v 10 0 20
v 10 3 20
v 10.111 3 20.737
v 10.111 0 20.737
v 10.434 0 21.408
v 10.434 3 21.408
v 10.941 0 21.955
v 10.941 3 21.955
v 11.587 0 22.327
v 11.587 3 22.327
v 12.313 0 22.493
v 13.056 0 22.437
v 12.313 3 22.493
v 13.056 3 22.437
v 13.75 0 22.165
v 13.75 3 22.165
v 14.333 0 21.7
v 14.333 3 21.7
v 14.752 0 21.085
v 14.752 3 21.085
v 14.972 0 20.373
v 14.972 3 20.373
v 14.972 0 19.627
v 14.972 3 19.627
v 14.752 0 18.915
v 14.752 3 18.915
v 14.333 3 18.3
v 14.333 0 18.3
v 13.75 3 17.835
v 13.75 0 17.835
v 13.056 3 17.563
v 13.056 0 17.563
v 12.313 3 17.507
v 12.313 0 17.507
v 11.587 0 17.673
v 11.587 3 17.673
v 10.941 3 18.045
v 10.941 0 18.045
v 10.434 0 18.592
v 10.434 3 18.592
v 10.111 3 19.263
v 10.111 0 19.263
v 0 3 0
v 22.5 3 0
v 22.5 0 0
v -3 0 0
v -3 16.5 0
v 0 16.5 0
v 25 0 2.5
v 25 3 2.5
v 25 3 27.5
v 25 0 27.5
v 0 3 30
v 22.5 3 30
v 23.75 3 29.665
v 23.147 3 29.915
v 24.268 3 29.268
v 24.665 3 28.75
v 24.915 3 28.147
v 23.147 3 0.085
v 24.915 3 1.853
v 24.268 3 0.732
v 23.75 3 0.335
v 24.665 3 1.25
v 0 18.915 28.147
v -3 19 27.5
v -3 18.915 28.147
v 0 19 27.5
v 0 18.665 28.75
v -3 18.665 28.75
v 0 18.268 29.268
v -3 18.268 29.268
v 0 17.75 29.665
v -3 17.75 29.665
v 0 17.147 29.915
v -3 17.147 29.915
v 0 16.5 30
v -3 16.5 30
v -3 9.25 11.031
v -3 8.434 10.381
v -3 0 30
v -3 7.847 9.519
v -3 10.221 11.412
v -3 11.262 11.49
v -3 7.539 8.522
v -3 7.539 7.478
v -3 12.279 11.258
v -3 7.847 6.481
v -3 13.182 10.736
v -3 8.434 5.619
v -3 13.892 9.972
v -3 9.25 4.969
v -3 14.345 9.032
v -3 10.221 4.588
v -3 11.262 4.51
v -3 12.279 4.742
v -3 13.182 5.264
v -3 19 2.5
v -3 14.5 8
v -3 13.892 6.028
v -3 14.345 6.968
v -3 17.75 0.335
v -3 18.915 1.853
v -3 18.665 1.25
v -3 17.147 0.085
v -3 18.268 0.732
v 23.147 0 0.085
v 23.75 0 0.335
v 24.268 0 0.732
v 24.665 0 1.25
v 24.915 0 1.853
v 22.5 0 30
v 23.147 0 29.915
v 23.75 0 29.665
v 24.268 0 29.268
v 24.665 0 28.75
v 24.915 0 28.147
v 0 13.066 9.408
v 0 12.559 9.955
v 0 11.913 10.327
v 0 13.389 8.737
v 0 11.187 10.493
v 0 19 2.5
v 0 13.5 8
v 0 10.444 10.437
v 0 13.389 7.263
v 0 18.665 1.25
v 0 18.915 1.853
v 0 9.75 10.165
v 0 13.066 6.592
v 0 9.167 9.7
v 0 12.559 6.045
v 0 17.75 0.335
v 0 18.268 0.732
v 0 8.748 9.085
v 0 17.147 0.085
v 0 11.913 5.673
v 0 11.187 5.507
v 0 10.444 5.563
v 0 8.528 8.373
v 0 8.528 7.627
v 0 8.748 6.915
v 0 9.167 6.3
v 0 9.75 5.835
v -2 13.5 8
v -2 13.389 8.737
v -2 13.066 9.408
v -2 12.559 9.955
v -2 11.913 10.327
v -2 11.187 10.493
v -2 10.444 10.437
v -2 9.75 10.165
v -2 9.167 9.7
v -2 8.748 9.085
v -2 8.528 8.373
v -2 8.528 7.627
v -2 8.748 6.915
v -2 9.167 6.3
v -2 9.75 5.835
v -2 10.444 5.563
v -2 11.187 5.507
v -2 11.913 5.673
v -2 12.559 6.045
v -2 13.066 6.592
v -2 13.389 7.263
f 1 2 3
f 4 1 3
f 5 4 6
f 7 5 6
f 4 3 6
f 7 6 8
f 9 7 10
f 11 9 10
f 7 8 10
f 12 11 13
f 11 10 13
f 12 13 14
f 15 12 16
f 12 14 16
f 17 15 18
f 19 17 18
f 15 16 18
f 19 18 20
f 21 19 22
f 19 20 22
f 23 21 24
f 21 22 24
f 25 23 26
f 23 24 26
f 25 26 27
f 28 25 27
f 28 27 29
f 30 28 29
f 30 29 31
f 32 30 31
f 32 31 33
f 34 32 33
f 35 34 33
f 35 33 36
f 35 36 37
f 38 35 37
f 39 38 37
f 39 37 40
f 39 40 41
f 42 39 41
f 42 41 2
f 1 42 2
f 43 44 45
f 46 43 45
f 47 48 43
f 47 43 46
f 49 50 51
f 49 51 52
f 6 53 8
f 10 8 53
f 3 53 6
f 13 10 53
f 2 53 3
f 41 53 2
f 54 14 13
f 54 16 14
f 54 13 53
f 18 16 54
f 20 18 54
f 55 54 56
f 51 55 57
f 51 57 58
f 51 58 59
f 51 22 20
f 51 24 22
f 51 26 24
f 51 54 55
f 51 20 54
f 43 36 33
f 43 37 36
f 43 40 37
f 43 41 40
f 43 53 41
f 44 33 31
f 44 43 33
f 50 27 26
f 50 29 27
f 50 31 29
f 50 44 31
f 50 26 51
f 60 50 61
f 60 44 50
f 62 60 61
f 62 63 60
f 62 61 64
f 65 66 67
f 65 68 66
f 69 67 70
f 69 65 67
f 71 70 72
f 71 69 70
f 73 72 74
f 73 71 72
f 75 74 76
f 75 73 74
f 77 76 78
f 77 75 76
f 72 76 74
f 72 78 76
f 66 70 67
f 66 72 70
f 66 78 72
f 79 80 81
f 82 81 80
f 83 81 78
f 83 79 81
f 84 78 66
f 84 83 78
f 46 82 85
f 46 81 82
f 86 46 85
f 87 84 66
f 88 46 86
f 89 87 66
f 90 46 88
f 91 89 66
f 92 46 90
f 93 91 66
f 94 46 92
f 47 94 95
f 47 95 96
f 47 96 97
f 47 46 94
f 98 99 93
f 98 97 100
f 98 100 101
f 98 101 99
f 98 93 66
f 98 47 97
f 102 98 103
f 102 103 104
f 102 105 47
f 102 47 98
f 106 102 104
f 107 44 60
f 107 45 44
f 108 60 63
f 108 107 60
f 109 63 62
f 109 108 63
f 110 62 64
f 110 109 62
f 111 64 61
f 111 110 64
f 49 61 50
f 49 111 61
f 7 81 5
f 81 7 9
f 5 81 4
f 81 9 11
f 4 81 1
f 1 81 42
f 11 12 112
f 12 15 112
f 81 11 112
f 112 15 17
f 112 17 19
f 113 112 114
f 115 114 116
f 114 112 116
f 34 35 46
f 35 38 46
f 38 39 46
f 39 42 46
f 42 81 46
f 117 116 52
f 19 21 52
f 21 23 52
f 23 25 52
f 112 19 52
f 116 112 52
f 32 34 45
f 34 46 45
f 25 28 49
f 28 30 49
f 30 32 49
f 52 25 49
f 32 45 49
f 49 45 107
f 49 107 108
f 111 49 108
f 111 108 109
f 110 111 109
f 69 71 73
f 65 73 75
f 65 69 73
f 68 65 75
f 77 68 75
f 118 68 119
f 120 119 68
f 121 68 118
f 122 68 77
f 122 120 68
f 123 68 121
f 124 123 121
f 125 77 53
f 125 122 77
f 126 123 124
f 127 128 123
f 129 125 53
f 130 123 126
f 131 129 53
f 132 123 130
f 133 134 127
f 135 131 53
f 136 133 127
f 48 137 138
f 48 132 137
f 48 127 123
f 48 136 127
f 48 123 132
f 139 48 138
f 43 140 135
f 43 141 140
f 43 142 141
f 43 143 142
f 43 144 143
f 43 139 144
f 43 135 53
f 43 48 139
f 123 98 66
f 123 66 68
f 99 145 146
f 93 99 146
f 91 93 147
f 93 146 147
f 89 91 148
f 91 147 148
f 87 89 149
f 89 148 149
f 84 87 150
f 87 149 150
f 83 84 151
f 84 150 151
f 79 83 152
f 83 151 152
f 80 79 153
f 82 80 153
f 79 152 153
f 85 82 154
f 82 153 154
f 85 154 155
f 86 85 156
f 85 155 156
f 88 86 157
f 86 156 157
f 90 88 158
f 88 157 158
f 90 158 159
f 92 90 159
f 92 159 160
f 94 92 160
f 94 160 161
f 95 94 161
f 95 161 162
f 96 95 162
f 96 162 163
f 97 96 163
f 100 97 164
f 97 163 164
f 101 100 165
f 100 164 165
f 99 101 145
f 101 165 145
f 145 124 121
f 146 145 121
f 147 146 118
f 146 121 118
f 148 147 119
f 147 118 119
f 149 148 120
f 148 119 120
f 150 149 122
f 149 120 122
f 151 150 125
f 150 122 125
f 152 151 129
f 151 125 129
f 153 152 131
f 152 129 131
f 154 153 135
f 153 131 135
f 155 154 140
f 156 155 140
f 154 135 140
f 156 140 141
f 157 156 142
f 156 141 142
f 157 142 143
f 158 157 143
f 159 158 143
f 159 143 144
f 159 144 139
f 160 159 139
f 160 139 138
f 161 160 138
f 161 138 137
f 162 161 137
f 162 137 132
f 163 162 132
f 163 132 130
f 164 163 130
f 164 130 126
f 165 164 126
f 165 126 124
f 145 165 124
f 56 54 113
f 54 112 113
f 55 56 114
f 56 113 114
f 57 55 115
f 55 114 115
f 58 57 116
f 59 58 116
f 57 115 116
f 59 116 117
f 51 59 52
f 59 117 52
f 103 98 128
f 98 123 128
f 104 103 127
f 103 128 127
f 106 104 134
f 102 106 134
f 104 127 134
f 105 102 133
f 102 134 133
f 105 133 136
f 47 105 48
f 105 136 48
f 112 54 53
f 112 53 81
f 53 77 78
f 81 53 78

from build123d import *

# Parameters (mm, degrees)
PAD_DEPTH       = 30
SKETCH001_R     = 2.5
POCKET_DEPTH    = 3.001
SKETCH002_R     = 2.5
POCKET001_DEPTH = 5
FILLET_R        = 2.5
CHAMFER_SIZE    = 1


with BuildPart() as part:
    # Sketch → Pad (new body)
    with BuildSketch(Plane.XY):
        Polygon((-3, 19), (0, 19), (0, 3), (25, 3), (25, 0), (0, 0), (-3, 0), align=None)
    extrude(amount=PAD_DEPTH)

    # Sketch001 (on Face2 of Pad) → Pocket (cut, through all)
    with BuildSketch(Plane.YZ):
        with Locations((11, 8)):
            Circle(SKETCH001_R)
    extrude(amount=-POCKET_DEPTH, mode=Mode.SUBTRACT)

    # Sketch002 (on Face8 of Pocket) → Pocket001 (cut)
    with BuildSketch(Plane(origin=(0, 3, 0), x_dir=(-1, 0, 0), z_dir=(0, 1, 0))):
        with Locations((-12.5, 20)):
            Circle(SKETCH002_R)
    extrude(amount=-POCKET001_DEPTH, mode=Mode.SUBTRACT)

    # Fillet
    fillet_edges = [part.edges().sort_by_distance(p)[0] for p in [
        (25, 1.5, 0),
        (25, 1.5, 30),
        (-1.5, 19, 30),
        (-1.5, 19, 0),
    ]]
    fillet(fillet_edges, radius=FILLET_R)

    # Chamfer
    chamfer_edges = [part.edges().sort_by_distance(p)[0] for p in [
        (-3, 8.5, 8),
    ]]
    chamfer(chamfer_edges, length=CHAMFER_SIZE)


solid = part.part
